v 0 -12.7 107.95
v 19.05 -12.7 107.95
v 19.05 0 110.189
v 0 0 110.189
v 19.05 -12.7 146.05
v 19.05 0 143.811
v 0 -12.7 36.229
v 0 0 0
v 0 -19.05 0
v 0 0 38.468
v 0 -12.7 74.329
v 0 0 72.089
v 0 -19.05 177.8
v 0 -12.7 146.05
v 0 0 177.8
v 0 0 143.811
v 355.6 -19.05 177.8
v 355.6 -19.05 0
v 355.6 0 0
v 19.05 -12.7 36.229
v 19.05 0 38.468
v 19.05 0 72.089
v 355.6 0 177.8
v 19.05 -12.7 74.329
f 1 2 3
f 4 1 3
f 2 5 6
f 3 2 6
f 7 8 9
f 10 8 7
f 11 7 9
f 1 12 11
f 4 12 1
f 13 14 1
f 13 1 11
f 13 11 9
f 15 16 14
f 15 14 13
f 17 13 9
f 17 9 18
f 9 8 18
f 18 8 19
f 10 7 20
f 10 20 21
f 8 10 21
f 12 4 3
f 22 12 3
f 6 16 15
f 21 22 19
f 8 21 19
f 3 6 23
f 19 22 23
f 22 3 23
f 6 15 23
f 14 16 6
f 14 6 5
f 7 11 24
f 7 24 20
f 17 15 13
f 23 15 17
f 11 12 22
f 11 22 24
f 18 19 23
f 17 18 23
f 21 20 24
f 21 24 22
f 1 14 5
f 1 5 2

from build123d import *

# Parameters (mm, degrees)
F0_W     = 355.6
F0_H     = 177.8
F1_DEPTH = 19.05
F3_DEPTH = 19.05


with BuildPart() as f1:
    # F0 (on Front) → F1 (new body)
    with BuildSketch(Plane.XZ):
        with Locations((177.8, 88.9)):
            Rectangle(F0_W, F0_H)
    extrude(amount=F1_DEPTH)

    # F2 (on Right) → F3 (cut)
    with BuildSketch(Plane.YZ):
        Polygon((0, 143.810647), (-12.7, 146.05), (-12.7, 107.95), (0, 110.189353), align=None)
        Polygon((0, 38.468058), (0, 72.089353), (-12.7, 74.328705), (-12.7, 36.228705), align=None)
    extrude(amount=F3_DEPTH, mode=Mode.SUBTRACT)


solid = f1.part
